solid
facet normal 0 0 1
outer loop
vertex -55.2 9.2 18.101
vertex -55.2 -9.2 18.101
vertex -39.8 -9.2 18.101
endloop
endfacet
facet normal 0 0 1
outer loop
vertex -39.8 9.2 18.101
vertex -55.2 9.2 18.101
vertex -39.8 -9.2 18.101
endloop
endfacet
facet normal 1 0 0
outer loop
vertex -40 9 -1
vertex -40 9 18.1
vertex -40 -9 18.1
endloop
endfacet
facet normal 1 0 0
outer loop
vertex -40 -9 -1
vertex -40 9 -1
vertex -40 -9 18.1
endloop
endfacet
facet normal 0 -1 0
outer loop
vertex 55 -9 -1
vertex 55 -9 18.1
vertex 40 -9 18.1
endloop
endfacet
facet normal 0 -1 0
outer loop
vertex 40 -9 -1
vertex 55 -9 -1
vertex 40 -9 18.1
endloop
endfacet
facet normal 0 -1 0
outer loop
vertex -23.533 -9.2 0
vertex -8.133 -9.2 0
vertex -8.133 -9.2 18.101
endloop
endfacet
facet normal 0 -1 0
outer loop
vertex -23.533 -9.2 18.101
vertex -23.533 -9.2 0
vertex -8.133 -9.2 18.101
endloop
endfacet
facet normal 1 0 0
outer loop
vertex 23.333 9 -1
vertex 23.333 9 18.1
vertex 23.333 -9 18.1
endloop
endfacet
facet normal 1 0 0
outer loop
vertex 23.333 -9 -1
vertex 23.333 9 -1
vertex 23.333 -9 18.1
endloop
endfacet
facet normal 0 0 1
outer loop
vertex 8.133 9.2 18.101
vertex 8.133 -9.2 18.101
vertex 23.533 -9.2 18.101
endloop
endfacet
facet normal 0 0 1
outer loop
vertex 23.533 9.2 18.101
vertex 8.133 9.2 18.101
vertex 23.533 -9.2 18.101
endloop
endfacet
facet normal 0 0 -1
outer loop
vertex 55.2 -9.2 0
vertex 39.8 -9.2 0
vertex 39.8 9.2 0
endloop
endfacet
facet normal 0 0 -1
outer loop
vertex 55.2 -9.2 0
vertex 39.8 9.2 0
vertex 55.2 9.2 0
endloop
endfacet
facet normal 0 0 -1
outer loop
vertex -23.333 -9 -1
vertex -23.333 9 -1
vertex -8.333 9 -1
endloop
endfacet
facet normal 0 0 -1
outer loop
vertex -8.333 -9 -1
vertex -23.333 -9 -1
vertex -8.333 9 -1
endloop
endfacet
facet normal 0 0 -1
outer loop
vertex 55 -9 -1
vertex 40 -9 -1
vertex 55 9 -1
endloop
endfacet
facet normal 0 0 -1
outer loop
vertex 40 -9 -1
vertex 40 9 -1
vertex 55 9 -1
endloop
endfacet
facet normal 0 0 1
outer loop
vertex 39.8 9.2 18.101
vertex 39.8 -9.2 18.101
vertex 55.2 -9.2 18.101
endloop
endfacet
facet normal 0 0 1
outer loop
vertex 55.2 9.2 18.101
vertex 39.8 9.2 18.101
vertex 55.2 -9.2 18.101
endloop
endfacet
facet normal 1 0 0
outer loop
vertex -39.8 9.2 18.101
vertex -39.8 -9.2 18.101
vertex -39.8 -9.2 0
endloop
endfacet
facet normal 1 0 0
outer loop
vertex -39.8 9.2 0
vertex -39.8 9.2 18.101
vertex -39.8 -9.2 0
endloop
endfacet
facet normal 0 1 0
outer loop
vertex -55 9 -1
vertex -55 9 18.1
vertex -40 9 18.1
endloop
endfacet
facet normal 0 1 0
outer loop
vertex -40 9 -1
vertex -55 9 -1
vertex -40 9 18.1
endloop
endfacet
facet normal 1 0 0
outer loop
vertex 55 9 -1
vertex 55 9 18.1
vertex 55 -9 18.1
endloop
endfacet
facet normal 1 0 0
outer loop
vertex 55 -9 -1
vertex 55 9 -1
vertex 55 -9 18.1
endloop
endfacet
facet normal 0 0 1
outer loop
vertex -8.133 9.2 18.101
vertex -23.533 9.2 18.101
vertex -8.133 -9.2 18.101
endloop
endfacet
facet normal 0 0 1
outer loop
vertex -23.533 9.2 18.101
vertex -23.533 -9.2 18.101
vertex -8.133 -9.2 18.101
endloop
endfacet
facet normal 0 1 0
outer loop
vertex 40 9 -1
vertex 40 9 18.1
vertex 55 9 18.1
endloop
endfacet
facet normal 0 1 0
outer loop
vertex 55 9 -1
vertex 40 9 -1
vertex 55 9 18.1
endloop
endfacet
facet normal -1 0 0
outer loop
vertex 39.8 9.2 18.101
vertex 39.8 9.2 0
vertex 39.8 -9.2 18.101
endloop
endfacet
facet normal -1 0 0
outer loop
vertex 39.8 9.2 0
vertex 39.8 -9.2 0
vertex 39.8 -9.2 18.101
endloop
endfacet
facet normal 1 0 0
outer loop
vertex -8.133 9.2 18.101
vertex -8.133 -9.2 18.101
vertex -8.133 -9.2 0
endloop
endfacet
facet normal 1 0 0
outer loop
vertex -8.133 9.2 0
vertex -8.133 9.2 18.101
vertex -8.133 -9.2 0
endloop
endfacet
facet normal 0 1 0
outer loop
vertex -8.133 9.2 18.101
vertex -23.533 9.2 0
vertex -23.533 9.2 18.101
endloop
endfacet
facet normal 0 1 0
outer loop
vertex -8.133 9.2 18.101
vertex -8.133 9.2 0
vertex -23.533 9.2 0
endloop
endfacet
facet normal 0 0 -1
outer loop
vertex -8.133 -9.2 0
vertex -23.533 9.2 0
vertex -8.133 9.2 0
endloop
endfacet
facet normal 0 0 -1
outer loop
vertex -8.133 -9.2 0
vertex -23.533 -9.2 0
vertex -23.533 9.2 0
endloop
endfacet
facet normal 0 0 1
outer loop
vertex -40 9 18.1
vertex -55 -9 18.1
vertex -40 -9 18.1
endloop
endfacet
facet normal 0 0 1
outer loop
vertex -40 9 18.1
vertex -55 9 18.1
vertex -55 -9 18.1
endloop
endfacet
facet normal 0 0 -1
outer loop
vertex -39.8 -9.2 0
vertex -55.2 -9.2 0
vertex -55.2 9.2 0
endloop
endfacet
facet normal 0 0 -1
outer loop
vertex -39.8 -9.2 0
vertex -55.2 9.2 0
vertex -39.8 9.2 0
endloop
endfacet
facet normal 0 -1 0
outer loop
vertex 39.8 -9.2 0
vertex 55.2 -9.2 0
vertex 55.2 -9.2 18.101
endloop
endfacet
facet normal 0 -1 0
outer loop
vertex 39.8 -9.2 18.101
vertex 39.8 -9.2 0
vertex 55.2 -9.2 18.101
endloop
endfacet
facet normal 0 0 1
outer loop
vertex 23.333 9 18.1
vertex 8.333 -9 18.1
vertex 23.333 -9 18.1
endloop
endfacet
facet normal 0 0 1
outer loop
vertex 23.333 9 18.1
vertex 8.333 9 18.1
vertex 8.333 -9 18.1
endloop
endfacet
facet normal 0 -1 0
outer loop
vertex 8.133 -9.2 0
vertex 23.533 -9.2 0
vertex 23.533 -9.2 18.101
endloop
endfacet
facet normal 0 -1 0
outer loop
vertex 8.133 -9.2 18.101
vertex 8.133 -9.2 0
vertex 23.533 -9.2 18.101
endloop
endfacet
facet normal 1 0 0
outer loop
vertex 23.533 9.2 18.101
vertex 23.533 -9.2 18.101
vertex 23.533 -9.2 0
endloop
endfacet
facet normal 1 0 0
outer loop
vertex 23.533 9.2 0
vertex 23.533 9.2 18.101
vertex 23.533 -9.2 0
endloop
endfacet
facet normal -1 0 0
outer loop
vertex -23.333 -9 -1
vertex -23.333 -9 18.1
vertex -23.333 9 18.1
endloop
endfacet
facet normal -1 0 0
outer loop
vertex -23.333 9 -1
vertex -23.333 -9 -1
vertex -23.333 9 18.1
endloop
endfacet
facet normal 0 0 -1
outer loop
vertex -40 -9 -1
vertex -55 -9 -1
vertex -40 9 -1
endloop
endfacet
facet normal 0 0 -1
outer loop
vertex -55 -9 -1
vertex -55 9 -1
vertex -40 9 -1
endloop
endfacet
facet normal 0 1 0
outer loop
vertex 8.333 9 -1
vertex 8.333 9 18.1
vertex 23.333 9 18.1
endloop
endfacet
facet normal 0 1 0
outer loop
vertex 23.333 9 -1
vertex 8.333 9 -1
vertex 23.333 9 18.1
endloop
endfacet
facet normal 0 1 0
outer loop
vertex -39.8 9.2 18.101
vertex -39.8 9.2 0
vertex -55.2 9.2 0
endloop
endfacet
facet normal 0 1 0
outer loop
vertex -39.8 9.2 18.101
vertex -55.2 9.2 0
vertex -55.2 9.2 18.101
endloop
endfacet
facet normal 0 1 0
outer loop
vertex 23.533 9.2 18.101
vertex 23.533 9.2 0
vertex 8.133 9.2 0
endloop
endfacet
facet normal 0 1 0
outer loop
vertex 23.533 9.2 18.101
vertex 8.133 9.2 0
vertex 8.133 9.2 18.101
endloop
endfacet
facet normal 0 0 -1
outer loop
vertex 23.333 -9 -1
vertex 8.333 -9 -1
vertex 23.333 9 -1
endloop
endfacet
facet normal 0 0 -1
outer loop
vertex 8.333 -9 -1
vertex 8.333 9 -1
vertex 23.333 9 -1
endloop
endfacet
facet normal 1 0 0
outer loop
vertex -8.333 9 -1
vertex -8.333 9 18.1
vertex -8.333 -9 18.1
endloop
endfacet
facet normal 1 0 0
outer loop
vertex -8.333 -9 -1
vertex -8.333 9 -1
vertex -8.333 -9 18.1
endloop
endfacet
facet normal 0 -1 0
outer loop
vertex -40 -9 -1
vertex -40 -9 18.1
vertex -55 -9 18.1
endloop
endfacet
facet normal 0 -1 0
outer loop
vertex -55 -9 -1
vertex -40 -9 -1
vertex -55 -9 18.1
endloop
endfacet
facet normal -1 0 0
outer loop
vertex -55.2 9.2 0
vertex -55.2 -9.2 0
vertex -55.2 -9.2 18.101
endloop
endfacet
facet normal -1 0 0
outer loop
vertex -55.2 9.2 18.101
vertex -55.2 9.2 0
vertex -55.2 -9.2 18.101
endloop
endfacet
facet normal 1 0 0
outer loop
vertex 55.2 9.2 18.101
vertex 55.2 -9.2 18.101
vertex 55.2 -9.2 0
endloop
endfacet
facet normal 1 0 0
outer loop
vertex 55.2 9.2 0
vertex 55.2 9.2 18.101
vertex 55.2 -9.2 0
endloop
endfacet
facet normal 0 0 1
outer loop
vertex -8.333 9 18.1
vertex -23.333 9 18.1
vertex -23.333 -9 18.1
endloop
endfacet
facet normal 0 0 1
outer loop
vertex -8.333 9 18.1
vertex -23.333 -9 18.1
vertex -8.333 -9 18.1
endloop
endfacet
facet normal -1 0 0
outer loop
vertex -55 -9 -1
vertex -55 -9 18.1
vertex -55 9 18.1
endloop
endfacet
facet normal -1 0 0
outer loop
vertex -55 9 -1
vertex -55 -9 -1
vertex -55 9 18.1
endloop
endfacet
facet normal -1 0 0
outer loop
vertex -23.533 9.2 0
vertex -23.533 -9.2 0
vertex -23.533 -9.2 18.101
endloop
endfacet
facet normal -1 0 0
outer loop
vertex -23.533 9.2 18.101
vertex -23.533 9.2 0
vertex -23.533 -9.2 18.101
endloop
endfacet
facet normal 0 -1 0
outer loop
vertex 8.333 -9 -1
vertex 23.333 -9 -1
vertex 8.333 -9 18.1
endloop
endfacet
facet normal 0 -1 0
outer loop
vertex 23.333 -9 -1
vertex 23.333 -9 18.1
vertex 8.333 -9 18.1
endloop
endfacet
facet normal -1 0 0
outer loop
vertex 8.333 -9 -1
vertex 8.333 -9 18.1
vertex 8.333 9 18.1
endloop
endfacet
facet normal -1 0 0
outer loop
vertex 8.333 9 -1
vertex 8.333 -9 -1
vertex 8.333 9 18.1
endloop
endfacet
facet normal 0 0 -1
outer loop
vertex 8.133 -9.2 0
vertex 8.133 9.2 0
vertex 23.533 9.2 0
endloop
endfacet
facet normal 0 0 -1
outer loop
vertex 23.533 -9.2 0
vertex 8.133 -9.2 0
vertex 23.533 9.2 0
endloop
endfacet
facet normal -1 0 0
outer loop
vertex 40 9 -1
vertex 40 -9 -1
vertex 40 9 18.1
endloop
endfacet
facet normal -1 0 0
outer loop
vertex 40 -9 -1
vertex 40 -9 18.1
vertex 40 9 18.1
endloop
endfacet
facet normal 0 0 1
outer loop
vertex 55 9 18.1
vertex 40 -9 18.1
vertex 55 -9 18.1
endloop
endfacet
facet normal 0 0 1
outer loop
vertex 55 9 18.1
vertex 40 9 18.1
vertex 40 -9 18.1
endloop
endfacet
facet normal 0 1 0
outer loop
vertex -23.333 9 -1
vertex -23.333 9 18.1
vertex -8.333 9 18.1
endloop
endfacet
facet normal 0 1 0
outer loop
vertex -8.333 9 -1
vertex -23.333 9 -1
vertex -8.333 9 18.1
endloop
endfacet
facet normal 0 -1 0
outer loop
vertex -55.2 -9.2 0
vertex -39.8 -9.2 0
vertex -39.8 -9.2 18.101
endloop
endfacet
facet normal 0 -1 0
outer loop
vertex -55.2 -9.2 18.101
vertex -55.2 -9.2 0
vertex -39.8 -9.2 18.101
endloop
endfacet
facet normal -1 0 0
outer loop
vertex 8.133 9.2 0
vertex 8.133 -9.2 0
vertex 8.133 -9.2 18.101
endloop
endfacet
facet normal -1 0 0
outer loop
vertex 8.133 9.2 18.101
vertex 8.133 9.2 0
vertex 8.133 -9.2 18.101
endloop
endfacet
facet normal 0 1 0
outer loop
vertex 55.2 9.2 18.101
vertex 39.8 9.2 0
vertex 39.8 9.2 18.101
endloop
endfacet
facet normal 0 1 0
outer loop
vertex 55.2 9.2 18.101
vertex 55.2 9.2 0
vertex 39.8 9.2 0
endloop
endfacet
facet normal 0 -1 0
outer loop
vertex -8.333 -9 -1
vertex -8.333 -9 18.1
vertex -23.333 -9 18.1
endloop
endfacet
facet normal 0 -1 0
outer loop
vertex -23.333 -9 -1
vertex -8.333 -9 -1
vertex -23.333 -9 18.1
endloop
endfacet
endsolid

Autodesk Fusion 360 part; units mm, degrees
sketch "Contact Patch" plane through (0, 0, 0) normal (0, 0, 1) x (1, 0, 0)
  line L0 (75, 9) -> (-75, 9)
  line L1 (-75, 9) -> (-75, -9)
  line L2 (-75, -9) -> (75, -9)
  line L3 (75, -9) -> (75, 9)
  line L4 (75, 9) -> (-75, -9) construction
  line L5 (-75, 9) -> (75, -9) construction
  dimension "d5" = 18
  dimension "d6" = 150
ref_plane "WorkPlane1" through (0, 0, 18.1) normal (0, 0, 1) x (1, 0, 0)
sketch "Sketch2" plane through (0, 0, 18.1) normal (0, 0, 1) x (1, 0, 0)
  line L0 (-55, 8.9999) -> (-40, 8.9999)
  line L1 (-40, 8.9999) -> (-40, -8.9999)
  line L2 (-40, -8.9999) -> (-55, -8.9999)
  line L3 (-55, -8.9999) -> (-55, 8.9999)
  line L4 (-75, 9) -> (-75, -9)
  line L5 (75, 9) -> (-75, 9)
  line L6 (-75, -9) -> (75, -9)
  dimension "d45" = 20
  dimension "d46" = 15
  dimension "d47" = 0.0001
  dimension "d48" = 0.0001
extrude "Extrude1" add sketch "Sketch2" against normal up to surface (18.1 mm away) contours L0 L1 L2 L3 L5 L6 makes body 1
move_face "OffsetFaces1" offset 1 1 faces at (-50, 3, 0) on bodies 1
ref_plane "WorkPlane2" through (0, -9, 0) normal (0, 1, 0) x (0, 0, 1)
sketch "Sketch3" plane through (0, 0, 0) normal (0, 1, 0) x (0, 0, 1)
  line L0 (-1, -40) -> (-1, -55)
  line L1 (-1, -55) -> (18.1, -55)
  line L2 (18.1, -55) -> (18.1, -40)
  line L3 (18.1, -40) -> (-1, -40)
  line L4 (0, -55) -> (0, -40)
extrude "Extrude2" add sketch "Sketch3" along normal blind 8.9999 and the other way blind 8.9999 separate body contours L1 L2 L3 L4 makes body 2
move_face "OffsetFaces3" offset 0.001 1 faces at (-50, -3, 18.1) on bodies 2
move_face "OffsetFaces4" offset 0.2 4 faces at (-55, 3, 6.0337) (-45, 8.9999, 6.0337) (-40, 3, 12.0673) (-45, -8.9999, 6.0337) on bodies 2
copy_body "CutPasteBodies1" bodies 1 2 removing the originals makes body 3 makes body 4 in component "Joint"
pattern_linear "00000000-0000-0000-0000-000000000000" [suppressed]
component "Joint" placed x (1, 0, 0) y (0, 1, 0) z (0, 0, 1) at (0, 0, 0)
component "Joint" placed x (1, 0, 0) y (0, 1, 0) z (0, 0, 1) at (31.6667, 0, 0)
component "Joint" placed x (1, 0, 0) y (0, 1, 0) z (0, 0, 1) at (63.3333, 0, 0)
component "Joint" placed x (1, 0, 0) y (0, 1, 0) z (0, 0, 1) at (95, 0, 0)
equation "Length = 150 mm"
equation "Width = 18 mm"
equation "d5 = Width"
equation "d6 = Length"
equation "Nestled_T = 18 mm"
equation "Tenon_Height = Nestled_T + 0.1 mm" comment "Board Height plus clearance"
equation "d9 = Tenon_Height"
equation "SideOffset1 = 0.0001 mm"
equation "SideOffset2 = 0.0001 mm"
equation "UserOffset1 = 20 mm"
equation "Tenon_Length = 15 mm"
equation "UserOffset2 = 20 mm"
equation "Offset1 = UserOffset1"
equation "Offset2 = UserOffset2"
equation "Tenon_QTY = 4"
equation "Spacing_Length = Length - Offset1 - Offset2 - Tenon_Length"
equation "d30 = -Width / 2"
equation "Mortise_width1 = ( Width / 2 ) - SideOffset1"
equation "Mortise_width2 = ( Width / 2 ) - SideOffset2"
equation "d33 = Mortise_width1"
equation "d35 = Mortise_width2"
equation "Clearance = 0.2 mm"
equation "d40 = Clearance"
equation "d45 = Offset1"
equation "d46 = Tenon_Length"
equation "d47 = SideOffset1"
equation "d48 = SideOffset2"
equation "d49 = Tenon_QTY"
equation "d51 = Spacing_Length"
